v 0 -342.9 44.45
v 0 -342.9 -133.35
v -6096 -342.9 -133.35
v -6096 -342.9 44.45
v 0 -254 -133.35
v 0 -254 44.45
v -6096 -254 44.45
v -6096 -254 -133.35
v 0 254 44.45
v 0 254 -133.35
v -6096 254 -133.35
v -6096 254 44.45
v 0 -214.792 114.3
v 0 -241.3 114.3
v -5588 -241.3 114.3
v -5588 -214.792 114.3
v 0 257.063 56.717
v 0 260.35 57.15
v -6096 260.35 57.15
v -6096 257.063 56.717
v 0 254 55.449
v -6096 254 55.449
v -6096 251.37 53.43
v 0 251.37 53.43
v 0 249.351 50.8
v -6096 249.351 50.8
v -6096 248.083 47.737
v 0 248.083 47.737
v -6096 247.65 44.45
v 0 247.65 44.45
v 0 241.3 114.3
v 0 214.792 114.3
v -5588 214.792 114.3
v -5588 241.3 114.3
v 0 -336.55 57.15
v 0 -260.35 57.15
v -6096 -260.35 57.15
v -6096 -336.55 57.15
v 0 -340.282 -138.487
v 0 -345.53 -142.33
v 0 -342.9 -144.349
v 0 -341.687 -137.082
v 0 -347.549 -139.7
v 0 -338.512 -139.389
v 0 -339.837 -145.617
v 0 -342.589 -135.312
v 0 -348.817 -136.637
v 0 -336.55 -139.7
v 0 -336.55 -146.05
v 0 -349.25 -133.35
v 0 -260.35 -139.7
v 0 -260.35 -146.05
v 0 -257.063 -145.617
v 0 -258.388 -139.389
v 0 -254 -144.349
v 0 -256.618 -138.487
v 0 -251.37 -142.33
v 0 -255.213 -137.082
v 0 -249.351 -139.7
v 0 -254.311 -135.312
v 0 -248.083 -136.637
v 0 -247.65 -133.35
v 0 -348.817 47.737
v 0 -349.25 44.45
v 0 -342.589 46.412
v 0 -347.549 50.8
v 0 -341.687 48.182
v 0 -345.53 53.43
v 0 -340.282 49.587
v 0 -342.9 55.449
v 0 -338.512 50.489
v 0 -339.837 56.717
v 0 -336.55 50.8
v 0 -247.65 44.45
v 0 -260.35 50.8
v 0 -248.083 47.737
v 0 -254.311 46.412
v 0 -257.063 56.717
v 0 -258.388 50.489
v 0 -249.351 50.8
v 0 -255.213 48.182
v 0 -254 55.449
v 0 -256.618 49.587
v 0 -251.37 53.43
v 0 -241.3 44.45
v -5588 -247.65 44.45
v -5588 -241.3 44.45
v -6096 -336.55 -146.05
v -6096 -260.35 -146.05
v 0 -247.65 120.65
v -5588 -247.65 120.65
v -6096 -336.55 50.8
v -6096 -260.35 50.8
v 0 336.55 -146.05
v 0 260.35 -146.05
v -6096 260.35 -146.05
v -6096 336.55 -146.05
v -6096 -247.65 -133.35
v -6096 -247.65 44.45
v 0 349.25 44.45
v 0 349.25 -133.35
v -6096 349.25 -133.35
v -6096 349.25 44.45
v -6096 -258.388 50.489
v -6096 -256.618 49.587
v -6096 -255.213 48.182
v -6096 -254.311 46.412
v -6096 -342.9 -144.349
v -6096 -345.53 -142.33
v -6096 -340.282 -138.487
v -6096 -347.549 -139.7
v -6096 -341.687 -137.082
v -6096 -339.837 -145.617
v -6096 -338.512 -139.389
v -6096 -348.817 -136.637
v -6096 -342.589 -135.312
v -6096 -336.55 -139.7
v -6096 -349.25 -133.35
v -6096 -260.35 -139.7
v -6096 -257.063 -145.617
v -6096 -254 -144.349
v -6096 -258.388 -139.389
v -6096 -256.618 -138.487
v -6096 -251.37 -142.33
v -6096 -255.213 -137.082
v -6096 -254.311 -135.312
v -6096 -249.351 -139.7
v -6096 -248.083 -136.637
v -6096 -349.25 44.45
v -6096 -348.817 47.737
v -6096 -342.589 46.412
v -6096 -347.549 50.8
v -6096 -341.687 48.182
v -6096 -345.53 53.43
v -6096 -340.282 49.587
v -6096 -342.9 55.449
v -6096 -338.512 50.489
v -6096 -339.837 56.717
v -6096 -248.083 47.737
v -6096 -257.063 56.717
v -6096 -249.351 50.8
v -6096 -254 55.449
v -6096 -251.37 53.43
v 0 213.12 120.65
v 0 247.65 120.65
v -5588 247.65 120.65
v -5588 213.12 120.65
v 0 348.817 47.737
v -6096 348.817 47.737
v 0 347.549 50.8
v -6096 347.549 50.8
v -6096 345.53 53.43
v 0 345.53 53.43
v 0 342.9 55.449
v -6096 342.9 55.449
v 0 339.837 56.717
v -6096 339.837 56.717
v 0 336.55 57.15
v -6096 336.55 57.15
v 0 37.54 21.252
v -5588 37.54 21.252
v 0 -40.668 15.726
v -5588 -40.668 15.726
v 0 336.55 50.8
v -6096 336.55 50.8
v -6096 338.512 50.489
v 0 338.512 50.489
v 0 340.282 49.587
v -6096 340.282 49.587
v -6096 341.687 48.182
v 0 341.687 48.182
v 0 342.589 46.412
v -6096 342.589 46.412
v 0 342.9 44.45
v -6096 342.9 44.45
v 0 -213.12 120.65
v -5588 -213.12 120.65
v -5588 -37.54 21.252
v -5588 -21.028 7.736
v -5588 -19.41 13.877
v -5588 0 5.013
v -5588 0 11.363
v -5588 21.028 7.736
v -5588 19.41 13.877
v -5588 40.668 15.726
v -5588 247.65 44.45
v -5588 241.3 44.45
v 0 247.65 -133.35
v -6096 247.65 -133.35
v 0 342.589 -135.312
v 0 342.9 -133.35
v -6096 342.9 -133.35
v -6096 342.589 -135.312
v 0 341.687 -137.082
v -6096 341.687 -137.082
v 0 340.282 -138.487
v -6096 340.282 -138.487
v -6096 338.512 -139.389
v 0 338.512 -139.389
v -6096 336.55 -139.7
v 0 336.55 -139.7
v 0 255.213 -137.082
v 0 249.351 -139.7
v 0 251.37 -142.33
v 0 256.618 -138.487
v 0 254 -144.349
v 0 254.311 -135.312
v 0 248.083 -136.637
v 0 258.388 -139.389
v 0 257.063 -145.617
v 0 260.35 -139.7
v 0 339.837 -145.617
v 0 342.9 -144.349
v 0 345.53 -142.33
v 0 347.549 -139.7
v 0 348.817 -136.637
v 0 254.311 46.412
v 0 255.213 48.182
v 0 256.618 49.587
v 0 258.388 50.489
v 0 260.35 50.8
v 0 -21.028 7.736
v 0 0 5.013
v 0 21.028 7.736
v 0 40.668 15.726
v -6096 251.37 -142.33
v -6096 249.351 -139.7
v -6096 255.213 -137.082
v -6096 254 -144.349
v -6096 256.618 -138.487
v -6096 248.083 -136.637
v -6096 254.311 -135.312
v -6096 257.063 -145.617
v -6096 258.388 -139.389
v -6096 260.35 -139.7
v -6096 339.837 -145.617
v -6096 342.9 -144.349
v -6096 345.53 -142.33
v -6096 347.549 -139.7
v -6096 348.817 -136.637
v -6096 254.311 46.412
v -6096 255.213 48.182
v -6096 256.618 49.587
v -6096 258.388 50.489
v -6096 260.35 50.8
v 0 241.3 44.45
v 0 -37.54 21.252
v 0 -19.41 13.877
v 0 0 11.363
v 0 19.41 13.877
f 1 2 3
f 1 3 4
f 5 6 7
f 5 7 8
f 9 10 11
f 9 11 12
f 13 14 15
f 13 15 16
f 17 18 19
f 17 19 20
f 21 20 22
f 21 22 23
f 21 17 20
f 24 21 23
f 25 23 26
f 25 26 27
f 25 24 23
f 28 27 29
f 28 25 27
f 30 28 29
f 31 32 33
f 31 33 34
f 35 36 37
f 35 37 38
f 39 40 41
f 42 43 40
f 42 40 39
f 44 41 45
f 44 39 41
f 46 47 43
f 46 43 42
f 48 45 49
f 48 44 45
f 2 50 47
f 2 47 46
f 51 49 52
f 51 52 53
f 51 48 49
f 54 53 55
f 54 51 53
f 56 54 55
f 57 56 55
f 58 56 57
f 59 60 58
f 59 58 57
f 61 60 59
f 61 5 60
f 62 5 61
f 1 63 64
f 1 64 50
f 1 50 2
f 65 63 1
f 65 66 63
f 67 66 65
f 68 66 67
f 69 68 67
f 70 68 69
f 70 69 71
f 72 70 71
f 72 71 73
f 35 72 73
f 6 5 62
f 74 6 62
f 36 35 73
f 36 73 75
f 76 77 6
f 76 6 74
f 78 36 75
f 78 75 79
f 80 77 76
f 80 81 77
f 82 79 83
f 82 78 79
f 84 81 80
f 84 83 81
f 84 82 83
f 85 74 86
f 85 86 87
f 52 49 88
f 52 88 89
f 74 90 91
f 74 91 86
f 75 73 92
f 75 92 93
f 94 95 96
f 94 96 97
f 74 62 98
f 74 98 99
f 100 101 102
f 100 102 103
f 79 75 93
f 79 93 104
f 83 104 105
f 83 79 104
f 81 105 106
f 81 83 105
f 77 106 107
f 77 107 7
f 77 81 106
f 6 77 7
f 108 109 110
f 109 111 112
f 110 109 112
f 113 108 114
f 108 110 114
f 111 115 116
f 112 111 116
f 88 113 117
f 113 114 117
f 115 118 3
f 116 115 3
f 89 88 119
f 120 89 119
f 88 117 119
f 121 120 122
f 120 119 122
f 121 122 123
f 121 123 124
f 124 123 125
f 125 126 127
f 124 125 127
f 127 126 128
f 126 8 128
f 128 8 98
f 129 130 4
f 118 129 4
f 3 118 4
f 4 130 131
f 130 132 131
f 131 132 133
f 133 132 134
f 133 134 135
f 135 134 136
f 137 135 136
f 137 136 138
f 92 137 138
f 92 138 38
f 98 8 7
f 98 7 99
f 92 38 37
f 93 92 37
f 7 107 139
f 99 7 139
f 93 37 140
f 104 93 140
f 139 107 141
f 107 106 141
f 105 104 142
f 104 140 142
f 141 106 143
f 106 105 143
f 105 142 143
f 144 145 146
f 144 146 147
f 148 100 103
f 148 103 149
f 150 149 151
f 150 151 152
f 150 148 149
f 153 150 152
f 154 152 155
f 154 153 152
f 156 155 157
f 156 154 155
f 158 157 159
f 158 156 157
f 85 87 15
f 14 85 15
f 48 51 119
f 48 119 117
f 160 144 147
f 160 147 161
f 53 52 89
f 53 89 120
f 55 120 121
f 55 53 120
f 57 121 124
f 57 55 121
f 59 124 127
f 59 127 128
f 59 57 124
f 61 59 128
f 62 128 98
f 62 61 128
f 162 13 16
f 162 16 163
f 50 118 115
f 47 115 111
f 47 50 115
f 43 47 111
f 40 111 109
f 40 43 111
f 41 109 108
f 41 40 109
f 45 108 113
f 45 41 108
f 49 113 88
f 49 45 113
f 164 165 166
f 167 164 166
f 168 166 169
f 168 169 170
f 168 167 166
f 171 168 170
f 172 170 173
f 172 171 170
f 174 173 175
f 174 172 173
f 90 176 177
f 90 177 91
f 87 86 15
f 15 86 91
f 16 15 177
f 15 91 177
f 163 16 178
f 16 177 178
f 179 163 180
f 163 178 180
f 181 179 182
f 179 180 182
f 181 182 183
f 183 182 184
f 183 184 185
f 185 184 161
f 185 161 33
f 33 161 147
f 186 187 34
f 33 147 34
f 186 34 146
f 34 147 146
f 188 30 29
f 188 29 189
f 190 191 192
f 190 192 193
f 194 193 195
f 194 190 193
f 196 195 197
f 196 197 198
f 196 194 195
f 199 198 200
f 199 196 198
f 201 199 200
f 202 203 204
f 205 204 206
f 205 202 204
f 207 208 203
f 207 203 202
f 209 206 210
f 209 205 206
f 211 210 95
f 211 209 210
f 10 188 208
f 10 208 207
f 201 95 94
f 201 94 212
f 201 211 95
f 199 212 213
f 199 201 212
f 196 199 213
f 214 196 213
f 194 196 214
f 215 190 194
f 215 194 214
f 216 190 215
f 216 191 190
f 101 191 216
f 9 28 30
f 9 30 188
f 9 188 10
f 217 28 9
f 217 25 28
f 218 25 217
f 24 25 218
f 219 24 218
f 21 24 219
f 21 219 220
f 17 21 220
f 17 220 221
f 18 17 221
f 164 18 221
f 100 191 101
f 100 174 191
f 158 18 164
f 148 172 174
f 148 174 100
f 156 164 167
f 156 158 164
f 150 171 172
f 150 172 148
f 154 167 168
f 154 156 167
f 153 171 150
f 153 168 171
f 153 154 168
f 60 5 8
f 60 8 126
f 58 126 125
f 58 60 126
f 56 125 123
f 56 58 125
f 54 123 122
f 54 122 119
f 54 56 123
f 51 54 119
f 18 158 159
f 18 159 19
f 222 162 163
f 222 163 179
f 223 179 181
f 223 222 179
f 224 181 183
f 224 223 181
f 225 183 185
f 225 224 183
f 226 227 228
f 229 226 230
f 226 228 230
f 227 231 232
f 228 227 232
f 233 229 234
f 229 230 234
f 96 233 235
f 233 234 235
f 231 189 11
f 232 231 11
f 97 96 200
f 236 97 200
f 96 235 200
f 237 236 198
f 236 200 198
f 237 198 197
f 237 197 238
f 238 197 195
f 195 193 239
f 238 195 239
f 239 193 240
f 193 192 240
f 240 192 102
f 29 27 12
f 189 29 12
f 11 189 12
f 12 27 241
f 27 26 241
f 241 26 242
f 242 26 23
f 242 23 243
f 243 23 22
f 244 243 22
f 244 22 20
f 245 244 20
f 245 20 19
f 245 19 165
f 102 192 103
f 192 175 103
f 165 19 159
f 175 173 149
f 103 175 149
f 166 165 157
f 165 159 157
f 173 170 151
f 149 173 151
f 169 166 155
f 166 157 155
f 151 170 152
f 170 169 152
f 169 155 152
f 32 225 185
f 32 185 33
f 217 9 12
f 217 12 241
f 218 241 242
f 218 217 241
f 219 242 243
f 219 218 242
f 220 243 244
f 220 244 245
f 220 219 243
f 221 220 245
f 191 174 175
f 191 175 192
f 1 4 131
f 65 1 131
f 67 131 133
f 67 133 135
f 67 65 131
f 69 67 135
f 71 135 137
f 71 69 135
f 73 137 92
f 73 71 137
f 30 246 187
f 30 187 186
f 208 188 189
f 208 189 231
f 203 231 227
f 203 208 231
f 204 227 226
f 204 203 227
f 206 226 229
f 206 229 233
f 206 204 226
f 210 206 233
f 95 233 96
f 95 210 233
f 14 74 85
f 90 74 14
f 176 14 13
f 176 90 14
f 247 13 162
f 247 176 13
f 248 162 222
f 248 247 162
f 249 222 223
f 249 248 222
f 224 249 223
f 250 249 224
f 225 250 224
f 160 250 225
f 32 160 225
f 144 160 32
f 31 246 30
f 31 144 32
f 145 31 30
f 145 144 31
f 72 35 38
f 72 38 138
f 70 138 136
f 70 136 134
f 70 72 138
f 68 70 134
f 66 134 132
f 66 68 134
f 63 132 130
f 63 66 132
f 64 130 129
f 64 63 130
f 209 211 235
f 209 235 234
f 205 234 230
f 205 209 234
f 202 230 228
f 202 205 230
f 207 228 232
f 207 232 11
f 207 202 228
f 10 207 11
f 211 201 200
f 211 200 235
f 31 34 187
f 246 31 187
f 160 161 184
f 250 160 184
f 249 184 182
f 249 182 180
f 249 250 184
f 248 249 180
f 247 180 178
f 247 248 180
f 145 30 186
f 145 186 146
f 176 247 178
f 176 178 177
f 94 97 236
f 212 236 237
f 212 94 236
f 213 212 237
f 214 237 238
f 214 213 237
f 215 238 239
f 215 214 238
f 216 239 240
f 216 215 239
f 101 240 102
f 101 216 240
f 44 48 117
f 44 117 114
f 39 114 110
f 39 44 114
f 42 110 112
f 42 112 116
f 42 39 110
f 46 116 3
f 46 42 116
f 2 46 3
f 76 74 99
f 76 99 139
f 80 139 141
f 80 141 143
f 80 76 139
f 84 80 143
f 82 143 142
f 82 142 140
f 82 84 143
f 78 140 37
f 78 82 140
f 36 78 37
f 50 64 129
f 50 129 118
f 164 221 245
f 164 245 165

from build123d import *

# Parameters (mm, degrees)
F1_DEPTH = 6096
F2_DEPTH = 5588


# Not quite as in the source:
# - a feature names something its author has since deleted; it is built from what else it names


with BuildPart() as f1:
    # F0 (on Right) → F1 (new body)
    with BuildSketch(Plane.YZ):
        with BuildLine():
            Line((-278.751844046, 57.15), (-336.55, 57.15))
            ThreePointArc((-336.55, 57.15), (-345.5302561211, 53.4302561211), (-349.25, 44.45))
            Line((-349.25, 44.45), (-349.25, -133.35))
            ThreePointArc((-349.25, -133.35), (-345.5302561211, -142.3302561211), (-336.55, -146.05))
            Line((-336.55, -146.05), (-260.35, -146.05))
            ThreePointArc((-260.35, -146.05), (-251.3697438789, -142.3302561211), (-247.65, -133.35))
            Line((-247.65, -133.35), (-247.65, 44.45))
            ThreePointArc((-247.65, 44.45), (-251.3697438789, 53.4302561211), (-260.35, 57.15))
            Line((-260.35, 57.15), (-268.1402802436, 57.15))
            Line((-268.1402802436, 57.15), (-269.3472818438, 57.15))
            Line((-269.3472818438, 57.15), (-278.751844046, 57.15))
        make_face()
        with BuildLine():
            ThreePointArc((-342.9, 44.45), (-341.0401280605, 48.9401280605), (-336.55, 50.8))
            Line((-336.55, 50.8), (-260.35, 50.8))
            ThreePointArc((-260.35, 50.8), (-255.8598719395, 48.9401280605), (-254, 44.45))
            Line((-254, 44.45), (-254, -133.35))
            ThreePointArc((-254, -133.35), (-255.8598719395, -137.8401280605), (-260.35, -139.7))
            Line((-260.35, -139.7), (-336.55, -139.7))
            ThreePointArc((-336.55, -139.7), (-341.0401280605, -137.8401280605), (-342.9, -133.35))
            Line((-342.9, -133.35), (-342.9, 44.45))
        make_face(mode=Mode.SUBTRACT)
    extrude(amount=-F1_DEPTH)


with BuildPart() as f1b:
    # F0 (on Right) → F1, piece 2 (new body)
    with BuildSketch(Plane.YZ):
        with BuildLine():
            ThreePointArc((260.35, 57.15), (251.3697438789, 53.4302561211), (247.65, 44.45))
            Line((247.65, 44.45), (247.65, -133.35))
            ThreePointArc((247.65, -133.35), (251.3697438789, -142.3302561211), (260.35, -146.05))
            Line((260.35, -146.05), (336.55, -146.05))
            ThreePointArc((336.55, -146.05), (345.5302561211, -142.3302561211), (349.25, -133.35))
            Line((349.25, -133.35), (349.25, 44.45))
            ThreePointArc((349.25, 44.45), (345.5302561211, 53.4302561211), (336.55, 57.15))
            Line((336.55, 57.15), (260.35, 57.15))
        make_face()
        with BuildLine():
            Line((260.35, 50.8), (336.55, 50.8))
            ThreePointArc((336.55, 50.8), (341.0401280605, 48.9401280605), (342.9, 44.45))
            Line((342.9, 44.45), (342.9, -133.35))
            ThreePointArc((342.9, -133.35), (341.0401280605, -137.8401280605), (336.55, -139.7))
            Line((336.55, -139.7), (260.35, -139.7))
            ThreePointArc((260.35, -139.7), (255.8598719395, -137.8401280605), (254, -133.35))
            Line((254, -133.35), (254, 44.45))
            ThreePointArc((254, 44.45), (255.8598719395, 48.9401280605), (260.35, 50.8))
        make_face(mode=Mode.SUBTRACT)
    extrude(amount=-F1_DEPTH)


with BuildPart() as f2:
    # F0 (on Right) → F2 (new body)
    with BuildSketch(Plane.YZ):
        with BuildLine():
            Line((-247.65, 120.65), (-247.65, 44.45))
            Line((-247.65, 44.45), (-241.3, 44.45))
            Line((-241.3, 44.45), (-241.3, 114.3))
            Line((-241.3, 114.3), (-214.7923633436, 114.3))
            Line((-214.7923633436, 114.3), (-40.6681247176, 15.7258547021))
            ThreePointArc((-40.6681247176, 15.7258547021), (0, 5.0132135897), (40.6681247176, 15.7258547021))
            Line((40.6681247176, 15.7258547021), (214.7923633436, 114.3))
            Line((214.7923633436, 114.3), (241.3, 114.3))
            Line((241.3, 114.3), (241.3, 44.45))
            Line((241.3, 44.45), (247.65, 44.45))
            Line((247.65, 44.45), (247.65, 120.65))
            Line((247.65, 120.65), (213.1196707487, 120.65))
            Line((213.1196707487, 120.65), (37.5398074317, 21.2518053858))
            ThreePointArc((37.5398074317, 21.2518053858), (0, 11.3632135897), (-37.5398074317, 21.2518053858))
            Line((-37.5398074317, 21.2518053858), (-213.1196707487, 120.65))
            Line((-213.1196707487, 120.65), (-247.65, 120.65))
        make_face()
    extrude(amount=-F2_DEPTH)


solid = Compound([f1.part, f1b.part, f2.part])
